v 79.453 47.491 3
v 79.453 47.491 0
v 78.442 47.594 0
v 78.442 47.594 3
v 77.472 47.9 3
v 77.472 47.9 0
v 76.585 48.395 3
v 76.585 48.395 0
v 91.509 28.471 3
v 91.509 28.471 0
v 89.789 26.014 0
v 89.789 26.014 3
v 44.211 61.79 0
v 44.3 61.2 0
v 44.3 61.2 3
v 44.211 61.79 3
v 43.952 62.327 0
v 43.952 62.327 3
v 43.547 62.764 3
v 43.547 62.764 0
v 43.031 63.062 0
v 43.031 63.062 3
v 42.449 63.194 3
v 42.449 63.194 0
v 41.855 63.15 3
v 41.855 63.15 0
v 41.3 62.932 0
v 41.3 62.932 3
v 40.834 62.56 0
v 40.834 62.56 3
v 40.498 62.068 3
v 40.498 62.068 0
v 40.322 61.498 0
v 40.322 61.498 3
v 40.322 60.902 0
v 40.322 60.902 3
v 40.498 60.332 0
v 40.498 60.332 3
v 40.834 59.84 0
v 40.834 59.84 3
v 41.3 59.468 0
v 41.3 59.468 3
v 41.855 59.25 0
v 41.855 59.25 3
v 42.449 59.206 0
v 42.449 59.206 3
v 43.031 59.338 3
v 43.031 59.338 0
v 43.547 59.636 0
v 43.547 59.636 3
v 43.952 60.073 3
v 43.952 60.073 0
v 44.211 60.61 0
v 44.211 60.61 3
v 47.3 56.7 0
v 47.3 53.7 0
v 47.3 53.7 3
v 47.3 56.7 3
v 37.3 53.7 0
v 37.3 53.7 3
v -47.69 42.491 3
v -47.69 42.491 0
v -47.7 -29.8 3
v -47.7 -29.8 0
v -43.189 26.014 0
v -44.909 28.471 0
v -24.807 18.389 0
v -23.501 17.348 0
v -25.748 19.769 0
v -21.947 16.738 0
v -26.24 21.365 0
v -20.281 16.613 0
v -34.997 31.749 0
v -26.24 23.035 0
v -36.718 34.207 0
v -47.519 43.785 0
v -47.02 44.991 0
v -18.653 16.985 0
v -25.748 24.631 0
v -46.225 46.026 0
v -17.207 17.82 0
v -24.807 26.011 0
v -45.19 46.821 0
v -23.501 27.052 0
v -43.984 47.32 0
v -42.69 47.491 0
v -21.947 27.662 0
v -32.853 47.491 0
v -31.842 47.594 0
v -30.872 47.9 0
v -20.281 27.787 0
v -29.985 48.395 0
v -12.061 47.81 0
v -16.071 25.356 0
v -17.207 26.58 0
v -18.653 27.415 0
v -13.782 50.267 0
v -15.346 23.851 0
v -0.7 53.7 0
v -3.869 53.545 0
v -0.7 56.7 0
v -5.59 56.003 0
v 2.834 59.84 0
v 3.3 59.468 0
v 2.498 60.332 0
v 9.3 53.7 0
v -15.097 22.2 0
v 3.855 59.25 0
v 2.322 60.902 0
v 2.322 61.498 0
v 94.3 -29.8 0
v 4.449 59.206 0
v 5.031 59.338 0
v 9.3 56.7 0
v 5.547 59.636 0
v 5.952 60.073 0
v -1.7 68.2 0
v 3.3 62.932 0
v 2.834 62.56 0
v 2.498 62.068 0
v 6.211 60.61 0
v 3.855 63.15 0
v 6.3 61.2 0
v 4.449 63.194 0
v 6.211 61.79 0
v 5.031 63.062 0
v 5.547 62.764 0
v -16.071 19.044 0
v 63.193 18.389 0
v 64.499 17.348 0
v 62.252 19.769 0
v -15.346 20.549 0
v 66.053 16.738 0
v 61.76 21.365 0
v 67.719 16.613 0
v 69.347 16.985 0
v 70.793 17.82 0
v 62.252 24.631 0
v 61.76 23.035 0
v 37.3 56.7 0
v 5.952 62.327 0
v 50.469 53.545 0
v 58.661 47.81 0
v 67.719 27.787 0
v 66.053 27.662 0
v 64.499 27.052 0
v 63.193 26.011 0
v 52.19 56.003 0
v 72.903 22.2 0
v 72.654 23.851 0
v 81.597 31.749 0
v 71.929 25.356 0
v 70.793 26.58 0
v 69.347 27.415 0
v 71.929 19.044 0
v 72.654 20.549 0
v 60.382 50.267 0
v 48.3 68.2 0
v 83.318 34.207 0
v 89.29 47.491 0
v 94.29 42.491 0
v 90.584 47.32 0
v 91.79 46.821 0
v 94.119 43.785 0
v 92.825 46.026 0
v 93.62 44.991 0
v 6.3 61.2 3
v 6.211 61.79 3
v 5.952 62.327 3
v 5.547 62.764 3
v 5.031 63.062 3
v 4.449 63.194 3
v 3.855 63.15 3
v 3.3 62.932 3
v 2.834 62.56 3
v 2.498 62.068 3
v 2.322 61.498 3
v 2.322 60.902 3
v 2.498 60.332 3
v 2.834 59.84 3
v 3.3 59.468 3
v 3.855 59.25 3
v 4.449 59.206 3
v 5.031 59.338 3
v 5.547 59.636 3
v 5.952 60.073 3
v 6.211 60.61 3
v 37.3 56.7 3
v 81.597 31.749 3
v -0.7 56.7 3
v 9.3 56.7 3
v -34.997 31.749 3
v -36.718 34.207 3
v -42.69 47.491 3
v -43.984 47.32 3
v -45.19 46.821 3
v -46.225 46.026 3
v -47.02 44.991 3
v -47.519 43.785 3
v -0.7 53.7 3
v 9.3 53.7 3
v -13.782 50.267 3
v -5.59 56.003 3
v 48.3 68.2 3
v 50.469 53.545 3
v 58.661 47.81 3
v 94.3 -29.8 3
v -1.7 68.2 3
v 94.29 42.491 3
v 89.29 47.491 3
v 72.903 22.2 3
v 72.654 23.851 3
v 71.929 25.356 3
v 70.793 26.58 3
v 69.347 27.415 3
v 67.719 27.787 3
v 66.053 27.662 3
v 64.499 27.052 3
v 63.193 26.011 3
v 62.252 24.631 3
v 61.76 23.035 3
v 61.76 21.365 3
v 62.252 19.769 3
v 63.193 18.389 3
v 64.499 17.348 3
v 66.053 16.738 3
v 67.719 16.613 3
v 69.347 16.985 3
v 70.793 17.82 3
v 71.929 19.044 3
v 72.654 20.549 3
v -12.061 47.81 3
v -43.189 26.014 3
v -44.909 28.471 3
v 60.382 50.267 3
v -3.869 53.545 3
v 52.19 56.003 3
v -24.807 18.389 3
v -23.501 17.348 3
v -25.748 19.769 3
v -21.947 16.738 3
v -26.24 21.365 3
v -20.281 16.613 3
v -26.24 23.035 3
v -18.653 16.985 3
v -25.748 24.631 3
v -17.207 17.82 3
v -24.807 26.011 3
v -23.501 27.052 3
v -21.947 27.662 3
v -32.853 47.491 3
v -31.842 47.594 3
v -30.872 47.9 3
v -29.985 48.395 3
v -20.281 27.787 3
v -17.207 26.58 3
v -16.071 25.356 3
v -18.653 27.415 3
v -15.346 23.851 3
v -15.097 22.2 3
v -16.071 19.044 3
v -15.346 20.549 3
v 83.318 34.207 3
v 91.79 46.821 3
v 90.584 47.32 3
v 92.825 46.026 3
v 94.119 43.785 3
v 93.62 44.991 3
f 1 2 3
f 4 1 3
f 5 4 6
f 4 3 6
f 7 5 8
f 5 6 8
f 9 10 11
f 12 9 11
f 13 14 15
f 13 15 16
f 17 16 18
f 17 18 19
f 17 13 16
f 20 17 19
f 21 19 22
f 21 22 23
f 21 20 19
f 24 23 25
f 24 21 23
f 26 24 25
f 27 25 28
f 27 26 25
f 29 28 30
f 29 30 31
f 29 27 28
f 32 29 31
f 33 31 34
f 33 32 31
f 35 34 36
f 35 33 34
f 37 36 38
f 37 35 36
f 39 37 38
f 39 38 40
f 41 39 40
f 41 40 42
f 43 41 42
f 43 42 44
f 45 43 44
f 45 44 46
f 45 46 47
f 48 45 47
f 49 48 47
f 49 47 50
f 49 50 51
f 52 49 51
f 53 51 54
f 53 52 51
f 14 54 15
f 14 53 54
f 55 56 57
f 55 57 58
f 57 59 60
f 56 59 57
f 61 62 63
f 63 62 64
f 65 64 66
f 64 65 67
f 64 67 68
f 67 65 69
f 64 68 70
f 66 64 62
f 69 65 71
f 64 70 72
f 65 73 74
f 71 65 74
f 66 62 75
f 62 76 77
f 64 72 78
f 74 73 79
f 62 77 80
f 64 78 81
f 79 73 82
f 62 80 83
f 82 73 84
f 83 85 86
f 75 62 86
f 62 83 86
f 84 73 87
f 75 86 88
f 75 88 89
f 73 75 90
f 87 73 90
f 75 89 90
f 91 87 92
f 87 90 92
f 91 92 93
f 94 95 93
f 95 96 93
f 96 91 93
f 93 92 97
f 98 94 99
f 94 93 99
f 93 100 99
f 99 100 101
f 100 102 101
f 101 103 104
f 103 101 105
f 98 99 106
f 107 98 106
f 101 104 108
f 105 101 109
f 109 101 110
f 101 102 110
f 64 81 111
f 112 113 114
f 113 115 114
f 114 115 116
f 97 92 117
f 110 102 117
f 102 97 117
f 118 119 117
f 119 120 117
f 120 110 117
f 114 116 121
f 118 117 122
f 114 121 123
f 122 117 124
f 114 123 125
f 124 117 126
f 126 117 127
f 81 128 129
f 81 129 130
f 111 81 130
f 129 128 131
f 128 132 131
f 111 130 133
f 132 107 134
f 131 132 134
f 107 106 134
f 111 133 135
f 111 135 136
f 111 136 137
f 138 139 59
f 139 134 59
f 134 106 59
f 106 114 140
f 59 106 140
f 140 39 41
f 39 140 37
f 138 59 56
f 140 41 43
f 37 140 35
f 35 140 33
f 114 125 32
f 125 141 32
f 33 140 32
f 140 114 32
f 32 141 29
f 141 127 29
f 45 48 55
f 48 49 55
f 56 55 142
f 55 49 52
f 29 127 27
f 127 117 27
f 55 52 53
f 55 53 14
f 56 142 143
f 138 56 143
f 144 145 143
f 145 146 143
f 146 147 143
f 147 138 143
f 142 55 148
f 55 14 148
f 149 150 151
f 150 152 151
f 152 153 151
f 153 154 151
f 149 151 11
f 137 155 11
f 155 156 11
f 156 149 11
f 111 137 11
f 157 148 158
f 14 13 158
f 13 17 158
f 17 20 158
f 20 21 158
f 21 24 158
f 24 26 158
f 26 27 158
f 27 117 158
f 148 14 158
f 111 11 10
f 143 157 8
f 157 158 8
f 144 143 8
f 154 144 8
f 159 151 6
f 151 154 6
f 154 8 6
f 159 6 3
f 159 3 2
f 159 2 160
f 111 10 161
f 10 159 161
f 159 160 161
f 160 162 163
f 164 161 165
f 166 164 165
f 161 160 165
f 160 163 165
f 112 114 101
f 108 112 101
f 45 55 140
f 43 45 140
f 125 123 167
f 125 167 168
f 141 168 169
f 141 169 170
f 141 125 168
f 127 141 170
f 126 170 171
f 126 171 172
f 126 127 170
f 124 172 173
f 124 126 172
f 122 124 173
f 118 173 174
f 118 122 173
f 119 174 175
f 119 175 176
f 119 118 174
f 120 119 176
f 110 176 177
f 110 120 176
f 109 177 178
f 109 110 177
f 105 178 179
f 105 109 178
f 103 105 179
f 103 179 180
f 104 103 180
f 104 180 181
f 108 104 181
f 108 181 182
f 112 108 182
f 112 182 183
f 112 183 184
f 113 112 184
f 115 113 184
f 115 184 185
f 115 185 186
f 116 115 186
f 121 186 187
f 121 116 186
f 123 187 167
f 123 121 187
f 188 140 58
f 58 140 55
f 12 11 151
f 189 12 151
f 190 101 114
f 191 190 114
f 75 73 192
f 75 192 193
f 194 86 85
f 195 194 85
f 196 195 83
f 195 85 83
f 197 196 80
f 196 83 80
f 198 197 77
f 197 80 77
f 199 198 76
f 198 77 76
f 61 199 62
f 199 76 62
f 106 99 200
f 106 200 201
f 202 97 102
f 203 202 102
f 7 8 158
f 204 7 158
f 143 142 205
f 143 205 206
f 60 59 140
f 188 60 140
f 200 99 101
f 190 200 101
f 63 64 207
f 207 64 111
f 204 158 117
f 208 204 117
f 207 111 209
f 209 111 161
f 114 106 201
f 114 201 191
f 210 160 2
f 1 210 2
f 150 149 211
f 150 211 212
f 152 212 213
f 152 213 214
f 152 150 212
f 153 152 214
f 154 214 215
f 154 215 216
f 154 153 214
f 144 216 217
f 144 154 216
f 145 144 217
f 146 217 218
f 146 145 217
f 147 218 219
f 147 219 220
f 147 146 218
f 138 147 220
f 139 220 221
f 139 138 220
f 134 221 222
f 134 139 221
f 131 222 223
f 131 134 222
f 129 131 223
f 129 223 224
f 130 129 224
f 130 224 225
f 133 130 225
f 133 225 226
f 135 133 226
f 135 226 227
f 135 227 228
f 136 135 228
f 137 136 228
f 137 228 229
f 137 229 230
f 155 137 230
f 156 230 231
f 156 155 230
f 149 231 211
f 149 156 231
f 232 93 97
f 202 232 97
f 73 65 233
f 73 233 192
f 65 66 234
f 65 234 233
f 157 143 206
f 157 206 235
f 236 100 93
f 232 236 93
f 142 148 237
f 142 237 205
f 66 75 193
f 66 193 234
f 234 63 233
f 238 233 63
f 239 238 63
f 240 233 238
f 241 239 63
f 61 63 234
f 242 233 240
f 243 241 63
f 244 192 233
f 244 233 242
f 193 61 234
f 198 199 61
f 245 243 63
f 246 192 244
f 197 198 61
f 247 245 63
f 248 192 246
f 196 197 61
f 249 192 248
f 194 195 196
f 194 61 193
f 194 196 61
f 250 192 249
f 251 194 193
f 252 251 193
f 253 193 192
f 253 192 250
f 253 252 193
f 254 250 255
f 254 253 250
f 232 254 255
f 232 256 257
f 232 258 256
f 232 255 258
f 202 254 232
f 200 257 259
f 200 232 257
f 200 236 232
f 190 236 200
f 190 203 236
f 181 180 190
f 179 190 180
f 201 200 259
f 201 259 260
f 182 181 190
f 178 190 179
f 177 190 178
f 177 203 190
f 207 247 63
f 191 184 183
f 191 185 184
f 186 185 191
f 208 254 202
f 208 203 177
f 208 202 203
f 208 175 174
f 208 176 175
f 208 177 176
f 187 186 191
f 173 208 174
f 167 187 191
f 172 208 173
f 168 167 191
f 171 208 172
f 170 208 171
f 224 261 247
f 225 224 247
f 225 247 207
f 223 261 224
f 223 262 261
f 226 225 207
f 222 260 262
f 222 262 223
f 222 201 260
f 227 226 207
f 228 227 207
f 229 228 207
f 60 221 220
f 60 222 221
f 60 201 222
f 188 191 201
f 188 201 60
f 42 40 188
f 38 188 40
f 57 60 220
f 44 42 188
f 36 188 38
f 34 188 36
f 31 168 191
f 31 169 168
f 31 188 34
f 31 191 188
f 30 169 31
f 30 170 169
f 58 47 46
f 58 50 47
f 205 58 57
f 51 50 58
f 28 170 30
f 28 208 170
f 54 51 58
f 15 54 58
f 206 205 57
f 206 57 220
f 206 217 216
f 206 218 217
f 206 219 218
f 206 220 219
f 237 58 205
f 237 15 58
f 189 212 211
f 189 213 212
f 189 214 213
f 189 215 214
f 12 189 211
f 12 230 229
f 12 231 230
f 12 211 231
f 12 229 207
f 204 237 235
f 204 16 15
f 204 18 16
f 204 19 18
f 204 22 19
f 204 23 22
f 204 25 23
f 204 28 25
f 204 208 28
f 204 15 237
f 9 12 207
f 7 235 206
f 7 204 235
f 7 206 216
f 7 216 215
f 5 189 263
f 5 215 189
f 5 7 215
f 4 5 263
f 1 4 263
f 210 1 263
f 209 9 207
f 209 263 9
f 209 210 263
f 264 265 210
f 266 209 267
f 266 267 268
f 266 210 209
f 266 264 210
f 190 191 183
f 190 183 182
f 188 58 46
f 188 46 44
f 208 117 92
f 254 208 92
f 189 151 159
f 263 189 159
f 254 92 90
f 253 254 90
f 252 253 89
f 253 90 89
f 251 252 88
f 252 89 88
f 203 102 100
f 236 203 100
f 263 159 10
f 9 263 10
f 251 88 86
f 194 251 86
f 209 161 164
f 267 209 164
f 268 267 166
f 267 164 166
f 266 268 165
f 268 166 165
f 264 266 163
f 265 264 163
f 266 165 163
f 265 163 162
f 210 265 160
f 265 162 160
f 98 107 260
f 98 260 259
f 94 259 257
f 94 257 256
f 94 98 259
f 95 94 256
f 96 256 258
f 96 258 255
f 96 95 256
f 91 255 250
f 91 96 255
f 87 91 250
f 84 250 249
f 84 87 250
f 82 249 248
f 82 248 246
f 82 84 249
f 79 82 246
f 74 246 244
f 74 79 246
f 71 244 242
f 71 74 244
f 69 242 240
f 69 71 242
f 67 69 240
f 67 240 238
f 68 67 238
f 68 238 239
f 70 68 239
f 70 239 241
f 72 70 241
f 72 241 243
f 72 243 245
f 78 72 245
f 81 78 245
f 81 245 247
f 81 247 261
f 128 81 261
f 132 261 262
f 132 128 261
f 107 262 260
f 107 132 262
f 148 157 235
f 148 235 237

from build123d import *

# Parameters (mm, degrees)
MODEL_R                 = 5.602685567
MODEL_R_2               = 2
MODEL_W                 = 10
MODEL_H                 = 3
SALIENTE_EXTRUIR1_DEPTH = 3


with BuildPart() as part:
    # Model → Saliente-Extruir1 (new body)
    with BuildSketch(Plane.XY):
        with BuildLine():
            Line((40.656841206, 68.2), (-1.7, 68.2))
            Line((-1.7, 68.2), (-29.984726632, 48.394821196))
            ThreePointArc((-29.984726632, 48.394821196), (-31.349079816, 47.721996664), (-32.852608814, 47.490581417))
            Line((-32.852608814, 47.490581417), (-42.689839841, 47.490581417))
            ThreePointArc((-42.689839841, 47.490581417), (-46.225125286, 46.026363766), (-47.689839791, 42.491284145))
            Line((-47.689839791, 42.491284145), (-47.7, -29.8))
            Line((-47.7, -29.8), (-18.946904924, -29.8))
            Line((-18.946904924, -29.8), (62.3, -29.8))
            Line((62.3, -29.8), (69.836645163, -29.8))
            Line((69.836645163, -29.8), (73.3, -29.8))
            Line((73.3, -29.8), (94.3, -29.8))
            Line((94.3, -29.8), (94.289839791, 42.491284145))
            ThreePointArc((94.289839791, 42.491284145), (92.825125286, 46.026363766), (89.289839841, 47.490581417))
            Line((89.289839841, 47.490581417), (79.452608814, 47.490581417))
            ThreePointArc((79.452608814, 47.490581417), (77.949079816, 47.721996664), (76.584726632, 48.394821196))
            Line((76.584726632, 48.394821196), (48.3, 68.2))
            Line((48.3, 68.2), (40.656841206, 68.2))
        make_face()
        with Locations((-20.7, 22.2)):
            Circle(MODEL_R, mode=Mode.SUBTRACT)
        with Locations((67.3, 22.2)):
            Circle(MODEL_R, mode=Mode.SUBTRACT)
        with Locations((42.3, 61.2)):
            Circle(MODEL_R_2, mode=Mode.SUBTRACT)
        with Locations((4.3, 61.2)):
            Circle(MODEL_R_2, mode=Mode.SUBTRACT)
        with Locations((4.3, 55.2)):
            Rectangle(MODEL_W, MODEL_H, mode=Mode.SUBTRACT)
        Polygon((58.660844318, 47.809630387), (60.381573627, 50.26708652), (52.190053184, 56.002850883), (50.469323875, 53.545394751), align=None, mode=Mode.SUBTRACT)
        with Locations((42.3, 55.2)):
            Rectangle(MODEL_W, MODEL_H, mode=Mode.SUBTRACT)
        Polygon((-12.060844318, 47.809630387), (-13.781573627, 50.26708652), (-5.590053184, 56.002850883), (-3.869323875, 53.545394751), align=None, mode=Mode.SUBTRACT)
        Polygon((-34.997101558, 31.749490169), (-36.717830867, 34.206946302), (-44.90935131, 28.471181939), (-43.188622001, 26.013725806), align=None, mode=Mode.SUBTRACT)
        Polygon((81.597101558, 31.749490169), (83.317830867, 34.206946302), (91.50935131, 28.471181939), (89.788622001, 26.013725806), align=None, mode=Mode.SUBTRACT)
    extrude(amount=SALIENTE_EXTRUIR1_DEPTH)


solid = part.part
